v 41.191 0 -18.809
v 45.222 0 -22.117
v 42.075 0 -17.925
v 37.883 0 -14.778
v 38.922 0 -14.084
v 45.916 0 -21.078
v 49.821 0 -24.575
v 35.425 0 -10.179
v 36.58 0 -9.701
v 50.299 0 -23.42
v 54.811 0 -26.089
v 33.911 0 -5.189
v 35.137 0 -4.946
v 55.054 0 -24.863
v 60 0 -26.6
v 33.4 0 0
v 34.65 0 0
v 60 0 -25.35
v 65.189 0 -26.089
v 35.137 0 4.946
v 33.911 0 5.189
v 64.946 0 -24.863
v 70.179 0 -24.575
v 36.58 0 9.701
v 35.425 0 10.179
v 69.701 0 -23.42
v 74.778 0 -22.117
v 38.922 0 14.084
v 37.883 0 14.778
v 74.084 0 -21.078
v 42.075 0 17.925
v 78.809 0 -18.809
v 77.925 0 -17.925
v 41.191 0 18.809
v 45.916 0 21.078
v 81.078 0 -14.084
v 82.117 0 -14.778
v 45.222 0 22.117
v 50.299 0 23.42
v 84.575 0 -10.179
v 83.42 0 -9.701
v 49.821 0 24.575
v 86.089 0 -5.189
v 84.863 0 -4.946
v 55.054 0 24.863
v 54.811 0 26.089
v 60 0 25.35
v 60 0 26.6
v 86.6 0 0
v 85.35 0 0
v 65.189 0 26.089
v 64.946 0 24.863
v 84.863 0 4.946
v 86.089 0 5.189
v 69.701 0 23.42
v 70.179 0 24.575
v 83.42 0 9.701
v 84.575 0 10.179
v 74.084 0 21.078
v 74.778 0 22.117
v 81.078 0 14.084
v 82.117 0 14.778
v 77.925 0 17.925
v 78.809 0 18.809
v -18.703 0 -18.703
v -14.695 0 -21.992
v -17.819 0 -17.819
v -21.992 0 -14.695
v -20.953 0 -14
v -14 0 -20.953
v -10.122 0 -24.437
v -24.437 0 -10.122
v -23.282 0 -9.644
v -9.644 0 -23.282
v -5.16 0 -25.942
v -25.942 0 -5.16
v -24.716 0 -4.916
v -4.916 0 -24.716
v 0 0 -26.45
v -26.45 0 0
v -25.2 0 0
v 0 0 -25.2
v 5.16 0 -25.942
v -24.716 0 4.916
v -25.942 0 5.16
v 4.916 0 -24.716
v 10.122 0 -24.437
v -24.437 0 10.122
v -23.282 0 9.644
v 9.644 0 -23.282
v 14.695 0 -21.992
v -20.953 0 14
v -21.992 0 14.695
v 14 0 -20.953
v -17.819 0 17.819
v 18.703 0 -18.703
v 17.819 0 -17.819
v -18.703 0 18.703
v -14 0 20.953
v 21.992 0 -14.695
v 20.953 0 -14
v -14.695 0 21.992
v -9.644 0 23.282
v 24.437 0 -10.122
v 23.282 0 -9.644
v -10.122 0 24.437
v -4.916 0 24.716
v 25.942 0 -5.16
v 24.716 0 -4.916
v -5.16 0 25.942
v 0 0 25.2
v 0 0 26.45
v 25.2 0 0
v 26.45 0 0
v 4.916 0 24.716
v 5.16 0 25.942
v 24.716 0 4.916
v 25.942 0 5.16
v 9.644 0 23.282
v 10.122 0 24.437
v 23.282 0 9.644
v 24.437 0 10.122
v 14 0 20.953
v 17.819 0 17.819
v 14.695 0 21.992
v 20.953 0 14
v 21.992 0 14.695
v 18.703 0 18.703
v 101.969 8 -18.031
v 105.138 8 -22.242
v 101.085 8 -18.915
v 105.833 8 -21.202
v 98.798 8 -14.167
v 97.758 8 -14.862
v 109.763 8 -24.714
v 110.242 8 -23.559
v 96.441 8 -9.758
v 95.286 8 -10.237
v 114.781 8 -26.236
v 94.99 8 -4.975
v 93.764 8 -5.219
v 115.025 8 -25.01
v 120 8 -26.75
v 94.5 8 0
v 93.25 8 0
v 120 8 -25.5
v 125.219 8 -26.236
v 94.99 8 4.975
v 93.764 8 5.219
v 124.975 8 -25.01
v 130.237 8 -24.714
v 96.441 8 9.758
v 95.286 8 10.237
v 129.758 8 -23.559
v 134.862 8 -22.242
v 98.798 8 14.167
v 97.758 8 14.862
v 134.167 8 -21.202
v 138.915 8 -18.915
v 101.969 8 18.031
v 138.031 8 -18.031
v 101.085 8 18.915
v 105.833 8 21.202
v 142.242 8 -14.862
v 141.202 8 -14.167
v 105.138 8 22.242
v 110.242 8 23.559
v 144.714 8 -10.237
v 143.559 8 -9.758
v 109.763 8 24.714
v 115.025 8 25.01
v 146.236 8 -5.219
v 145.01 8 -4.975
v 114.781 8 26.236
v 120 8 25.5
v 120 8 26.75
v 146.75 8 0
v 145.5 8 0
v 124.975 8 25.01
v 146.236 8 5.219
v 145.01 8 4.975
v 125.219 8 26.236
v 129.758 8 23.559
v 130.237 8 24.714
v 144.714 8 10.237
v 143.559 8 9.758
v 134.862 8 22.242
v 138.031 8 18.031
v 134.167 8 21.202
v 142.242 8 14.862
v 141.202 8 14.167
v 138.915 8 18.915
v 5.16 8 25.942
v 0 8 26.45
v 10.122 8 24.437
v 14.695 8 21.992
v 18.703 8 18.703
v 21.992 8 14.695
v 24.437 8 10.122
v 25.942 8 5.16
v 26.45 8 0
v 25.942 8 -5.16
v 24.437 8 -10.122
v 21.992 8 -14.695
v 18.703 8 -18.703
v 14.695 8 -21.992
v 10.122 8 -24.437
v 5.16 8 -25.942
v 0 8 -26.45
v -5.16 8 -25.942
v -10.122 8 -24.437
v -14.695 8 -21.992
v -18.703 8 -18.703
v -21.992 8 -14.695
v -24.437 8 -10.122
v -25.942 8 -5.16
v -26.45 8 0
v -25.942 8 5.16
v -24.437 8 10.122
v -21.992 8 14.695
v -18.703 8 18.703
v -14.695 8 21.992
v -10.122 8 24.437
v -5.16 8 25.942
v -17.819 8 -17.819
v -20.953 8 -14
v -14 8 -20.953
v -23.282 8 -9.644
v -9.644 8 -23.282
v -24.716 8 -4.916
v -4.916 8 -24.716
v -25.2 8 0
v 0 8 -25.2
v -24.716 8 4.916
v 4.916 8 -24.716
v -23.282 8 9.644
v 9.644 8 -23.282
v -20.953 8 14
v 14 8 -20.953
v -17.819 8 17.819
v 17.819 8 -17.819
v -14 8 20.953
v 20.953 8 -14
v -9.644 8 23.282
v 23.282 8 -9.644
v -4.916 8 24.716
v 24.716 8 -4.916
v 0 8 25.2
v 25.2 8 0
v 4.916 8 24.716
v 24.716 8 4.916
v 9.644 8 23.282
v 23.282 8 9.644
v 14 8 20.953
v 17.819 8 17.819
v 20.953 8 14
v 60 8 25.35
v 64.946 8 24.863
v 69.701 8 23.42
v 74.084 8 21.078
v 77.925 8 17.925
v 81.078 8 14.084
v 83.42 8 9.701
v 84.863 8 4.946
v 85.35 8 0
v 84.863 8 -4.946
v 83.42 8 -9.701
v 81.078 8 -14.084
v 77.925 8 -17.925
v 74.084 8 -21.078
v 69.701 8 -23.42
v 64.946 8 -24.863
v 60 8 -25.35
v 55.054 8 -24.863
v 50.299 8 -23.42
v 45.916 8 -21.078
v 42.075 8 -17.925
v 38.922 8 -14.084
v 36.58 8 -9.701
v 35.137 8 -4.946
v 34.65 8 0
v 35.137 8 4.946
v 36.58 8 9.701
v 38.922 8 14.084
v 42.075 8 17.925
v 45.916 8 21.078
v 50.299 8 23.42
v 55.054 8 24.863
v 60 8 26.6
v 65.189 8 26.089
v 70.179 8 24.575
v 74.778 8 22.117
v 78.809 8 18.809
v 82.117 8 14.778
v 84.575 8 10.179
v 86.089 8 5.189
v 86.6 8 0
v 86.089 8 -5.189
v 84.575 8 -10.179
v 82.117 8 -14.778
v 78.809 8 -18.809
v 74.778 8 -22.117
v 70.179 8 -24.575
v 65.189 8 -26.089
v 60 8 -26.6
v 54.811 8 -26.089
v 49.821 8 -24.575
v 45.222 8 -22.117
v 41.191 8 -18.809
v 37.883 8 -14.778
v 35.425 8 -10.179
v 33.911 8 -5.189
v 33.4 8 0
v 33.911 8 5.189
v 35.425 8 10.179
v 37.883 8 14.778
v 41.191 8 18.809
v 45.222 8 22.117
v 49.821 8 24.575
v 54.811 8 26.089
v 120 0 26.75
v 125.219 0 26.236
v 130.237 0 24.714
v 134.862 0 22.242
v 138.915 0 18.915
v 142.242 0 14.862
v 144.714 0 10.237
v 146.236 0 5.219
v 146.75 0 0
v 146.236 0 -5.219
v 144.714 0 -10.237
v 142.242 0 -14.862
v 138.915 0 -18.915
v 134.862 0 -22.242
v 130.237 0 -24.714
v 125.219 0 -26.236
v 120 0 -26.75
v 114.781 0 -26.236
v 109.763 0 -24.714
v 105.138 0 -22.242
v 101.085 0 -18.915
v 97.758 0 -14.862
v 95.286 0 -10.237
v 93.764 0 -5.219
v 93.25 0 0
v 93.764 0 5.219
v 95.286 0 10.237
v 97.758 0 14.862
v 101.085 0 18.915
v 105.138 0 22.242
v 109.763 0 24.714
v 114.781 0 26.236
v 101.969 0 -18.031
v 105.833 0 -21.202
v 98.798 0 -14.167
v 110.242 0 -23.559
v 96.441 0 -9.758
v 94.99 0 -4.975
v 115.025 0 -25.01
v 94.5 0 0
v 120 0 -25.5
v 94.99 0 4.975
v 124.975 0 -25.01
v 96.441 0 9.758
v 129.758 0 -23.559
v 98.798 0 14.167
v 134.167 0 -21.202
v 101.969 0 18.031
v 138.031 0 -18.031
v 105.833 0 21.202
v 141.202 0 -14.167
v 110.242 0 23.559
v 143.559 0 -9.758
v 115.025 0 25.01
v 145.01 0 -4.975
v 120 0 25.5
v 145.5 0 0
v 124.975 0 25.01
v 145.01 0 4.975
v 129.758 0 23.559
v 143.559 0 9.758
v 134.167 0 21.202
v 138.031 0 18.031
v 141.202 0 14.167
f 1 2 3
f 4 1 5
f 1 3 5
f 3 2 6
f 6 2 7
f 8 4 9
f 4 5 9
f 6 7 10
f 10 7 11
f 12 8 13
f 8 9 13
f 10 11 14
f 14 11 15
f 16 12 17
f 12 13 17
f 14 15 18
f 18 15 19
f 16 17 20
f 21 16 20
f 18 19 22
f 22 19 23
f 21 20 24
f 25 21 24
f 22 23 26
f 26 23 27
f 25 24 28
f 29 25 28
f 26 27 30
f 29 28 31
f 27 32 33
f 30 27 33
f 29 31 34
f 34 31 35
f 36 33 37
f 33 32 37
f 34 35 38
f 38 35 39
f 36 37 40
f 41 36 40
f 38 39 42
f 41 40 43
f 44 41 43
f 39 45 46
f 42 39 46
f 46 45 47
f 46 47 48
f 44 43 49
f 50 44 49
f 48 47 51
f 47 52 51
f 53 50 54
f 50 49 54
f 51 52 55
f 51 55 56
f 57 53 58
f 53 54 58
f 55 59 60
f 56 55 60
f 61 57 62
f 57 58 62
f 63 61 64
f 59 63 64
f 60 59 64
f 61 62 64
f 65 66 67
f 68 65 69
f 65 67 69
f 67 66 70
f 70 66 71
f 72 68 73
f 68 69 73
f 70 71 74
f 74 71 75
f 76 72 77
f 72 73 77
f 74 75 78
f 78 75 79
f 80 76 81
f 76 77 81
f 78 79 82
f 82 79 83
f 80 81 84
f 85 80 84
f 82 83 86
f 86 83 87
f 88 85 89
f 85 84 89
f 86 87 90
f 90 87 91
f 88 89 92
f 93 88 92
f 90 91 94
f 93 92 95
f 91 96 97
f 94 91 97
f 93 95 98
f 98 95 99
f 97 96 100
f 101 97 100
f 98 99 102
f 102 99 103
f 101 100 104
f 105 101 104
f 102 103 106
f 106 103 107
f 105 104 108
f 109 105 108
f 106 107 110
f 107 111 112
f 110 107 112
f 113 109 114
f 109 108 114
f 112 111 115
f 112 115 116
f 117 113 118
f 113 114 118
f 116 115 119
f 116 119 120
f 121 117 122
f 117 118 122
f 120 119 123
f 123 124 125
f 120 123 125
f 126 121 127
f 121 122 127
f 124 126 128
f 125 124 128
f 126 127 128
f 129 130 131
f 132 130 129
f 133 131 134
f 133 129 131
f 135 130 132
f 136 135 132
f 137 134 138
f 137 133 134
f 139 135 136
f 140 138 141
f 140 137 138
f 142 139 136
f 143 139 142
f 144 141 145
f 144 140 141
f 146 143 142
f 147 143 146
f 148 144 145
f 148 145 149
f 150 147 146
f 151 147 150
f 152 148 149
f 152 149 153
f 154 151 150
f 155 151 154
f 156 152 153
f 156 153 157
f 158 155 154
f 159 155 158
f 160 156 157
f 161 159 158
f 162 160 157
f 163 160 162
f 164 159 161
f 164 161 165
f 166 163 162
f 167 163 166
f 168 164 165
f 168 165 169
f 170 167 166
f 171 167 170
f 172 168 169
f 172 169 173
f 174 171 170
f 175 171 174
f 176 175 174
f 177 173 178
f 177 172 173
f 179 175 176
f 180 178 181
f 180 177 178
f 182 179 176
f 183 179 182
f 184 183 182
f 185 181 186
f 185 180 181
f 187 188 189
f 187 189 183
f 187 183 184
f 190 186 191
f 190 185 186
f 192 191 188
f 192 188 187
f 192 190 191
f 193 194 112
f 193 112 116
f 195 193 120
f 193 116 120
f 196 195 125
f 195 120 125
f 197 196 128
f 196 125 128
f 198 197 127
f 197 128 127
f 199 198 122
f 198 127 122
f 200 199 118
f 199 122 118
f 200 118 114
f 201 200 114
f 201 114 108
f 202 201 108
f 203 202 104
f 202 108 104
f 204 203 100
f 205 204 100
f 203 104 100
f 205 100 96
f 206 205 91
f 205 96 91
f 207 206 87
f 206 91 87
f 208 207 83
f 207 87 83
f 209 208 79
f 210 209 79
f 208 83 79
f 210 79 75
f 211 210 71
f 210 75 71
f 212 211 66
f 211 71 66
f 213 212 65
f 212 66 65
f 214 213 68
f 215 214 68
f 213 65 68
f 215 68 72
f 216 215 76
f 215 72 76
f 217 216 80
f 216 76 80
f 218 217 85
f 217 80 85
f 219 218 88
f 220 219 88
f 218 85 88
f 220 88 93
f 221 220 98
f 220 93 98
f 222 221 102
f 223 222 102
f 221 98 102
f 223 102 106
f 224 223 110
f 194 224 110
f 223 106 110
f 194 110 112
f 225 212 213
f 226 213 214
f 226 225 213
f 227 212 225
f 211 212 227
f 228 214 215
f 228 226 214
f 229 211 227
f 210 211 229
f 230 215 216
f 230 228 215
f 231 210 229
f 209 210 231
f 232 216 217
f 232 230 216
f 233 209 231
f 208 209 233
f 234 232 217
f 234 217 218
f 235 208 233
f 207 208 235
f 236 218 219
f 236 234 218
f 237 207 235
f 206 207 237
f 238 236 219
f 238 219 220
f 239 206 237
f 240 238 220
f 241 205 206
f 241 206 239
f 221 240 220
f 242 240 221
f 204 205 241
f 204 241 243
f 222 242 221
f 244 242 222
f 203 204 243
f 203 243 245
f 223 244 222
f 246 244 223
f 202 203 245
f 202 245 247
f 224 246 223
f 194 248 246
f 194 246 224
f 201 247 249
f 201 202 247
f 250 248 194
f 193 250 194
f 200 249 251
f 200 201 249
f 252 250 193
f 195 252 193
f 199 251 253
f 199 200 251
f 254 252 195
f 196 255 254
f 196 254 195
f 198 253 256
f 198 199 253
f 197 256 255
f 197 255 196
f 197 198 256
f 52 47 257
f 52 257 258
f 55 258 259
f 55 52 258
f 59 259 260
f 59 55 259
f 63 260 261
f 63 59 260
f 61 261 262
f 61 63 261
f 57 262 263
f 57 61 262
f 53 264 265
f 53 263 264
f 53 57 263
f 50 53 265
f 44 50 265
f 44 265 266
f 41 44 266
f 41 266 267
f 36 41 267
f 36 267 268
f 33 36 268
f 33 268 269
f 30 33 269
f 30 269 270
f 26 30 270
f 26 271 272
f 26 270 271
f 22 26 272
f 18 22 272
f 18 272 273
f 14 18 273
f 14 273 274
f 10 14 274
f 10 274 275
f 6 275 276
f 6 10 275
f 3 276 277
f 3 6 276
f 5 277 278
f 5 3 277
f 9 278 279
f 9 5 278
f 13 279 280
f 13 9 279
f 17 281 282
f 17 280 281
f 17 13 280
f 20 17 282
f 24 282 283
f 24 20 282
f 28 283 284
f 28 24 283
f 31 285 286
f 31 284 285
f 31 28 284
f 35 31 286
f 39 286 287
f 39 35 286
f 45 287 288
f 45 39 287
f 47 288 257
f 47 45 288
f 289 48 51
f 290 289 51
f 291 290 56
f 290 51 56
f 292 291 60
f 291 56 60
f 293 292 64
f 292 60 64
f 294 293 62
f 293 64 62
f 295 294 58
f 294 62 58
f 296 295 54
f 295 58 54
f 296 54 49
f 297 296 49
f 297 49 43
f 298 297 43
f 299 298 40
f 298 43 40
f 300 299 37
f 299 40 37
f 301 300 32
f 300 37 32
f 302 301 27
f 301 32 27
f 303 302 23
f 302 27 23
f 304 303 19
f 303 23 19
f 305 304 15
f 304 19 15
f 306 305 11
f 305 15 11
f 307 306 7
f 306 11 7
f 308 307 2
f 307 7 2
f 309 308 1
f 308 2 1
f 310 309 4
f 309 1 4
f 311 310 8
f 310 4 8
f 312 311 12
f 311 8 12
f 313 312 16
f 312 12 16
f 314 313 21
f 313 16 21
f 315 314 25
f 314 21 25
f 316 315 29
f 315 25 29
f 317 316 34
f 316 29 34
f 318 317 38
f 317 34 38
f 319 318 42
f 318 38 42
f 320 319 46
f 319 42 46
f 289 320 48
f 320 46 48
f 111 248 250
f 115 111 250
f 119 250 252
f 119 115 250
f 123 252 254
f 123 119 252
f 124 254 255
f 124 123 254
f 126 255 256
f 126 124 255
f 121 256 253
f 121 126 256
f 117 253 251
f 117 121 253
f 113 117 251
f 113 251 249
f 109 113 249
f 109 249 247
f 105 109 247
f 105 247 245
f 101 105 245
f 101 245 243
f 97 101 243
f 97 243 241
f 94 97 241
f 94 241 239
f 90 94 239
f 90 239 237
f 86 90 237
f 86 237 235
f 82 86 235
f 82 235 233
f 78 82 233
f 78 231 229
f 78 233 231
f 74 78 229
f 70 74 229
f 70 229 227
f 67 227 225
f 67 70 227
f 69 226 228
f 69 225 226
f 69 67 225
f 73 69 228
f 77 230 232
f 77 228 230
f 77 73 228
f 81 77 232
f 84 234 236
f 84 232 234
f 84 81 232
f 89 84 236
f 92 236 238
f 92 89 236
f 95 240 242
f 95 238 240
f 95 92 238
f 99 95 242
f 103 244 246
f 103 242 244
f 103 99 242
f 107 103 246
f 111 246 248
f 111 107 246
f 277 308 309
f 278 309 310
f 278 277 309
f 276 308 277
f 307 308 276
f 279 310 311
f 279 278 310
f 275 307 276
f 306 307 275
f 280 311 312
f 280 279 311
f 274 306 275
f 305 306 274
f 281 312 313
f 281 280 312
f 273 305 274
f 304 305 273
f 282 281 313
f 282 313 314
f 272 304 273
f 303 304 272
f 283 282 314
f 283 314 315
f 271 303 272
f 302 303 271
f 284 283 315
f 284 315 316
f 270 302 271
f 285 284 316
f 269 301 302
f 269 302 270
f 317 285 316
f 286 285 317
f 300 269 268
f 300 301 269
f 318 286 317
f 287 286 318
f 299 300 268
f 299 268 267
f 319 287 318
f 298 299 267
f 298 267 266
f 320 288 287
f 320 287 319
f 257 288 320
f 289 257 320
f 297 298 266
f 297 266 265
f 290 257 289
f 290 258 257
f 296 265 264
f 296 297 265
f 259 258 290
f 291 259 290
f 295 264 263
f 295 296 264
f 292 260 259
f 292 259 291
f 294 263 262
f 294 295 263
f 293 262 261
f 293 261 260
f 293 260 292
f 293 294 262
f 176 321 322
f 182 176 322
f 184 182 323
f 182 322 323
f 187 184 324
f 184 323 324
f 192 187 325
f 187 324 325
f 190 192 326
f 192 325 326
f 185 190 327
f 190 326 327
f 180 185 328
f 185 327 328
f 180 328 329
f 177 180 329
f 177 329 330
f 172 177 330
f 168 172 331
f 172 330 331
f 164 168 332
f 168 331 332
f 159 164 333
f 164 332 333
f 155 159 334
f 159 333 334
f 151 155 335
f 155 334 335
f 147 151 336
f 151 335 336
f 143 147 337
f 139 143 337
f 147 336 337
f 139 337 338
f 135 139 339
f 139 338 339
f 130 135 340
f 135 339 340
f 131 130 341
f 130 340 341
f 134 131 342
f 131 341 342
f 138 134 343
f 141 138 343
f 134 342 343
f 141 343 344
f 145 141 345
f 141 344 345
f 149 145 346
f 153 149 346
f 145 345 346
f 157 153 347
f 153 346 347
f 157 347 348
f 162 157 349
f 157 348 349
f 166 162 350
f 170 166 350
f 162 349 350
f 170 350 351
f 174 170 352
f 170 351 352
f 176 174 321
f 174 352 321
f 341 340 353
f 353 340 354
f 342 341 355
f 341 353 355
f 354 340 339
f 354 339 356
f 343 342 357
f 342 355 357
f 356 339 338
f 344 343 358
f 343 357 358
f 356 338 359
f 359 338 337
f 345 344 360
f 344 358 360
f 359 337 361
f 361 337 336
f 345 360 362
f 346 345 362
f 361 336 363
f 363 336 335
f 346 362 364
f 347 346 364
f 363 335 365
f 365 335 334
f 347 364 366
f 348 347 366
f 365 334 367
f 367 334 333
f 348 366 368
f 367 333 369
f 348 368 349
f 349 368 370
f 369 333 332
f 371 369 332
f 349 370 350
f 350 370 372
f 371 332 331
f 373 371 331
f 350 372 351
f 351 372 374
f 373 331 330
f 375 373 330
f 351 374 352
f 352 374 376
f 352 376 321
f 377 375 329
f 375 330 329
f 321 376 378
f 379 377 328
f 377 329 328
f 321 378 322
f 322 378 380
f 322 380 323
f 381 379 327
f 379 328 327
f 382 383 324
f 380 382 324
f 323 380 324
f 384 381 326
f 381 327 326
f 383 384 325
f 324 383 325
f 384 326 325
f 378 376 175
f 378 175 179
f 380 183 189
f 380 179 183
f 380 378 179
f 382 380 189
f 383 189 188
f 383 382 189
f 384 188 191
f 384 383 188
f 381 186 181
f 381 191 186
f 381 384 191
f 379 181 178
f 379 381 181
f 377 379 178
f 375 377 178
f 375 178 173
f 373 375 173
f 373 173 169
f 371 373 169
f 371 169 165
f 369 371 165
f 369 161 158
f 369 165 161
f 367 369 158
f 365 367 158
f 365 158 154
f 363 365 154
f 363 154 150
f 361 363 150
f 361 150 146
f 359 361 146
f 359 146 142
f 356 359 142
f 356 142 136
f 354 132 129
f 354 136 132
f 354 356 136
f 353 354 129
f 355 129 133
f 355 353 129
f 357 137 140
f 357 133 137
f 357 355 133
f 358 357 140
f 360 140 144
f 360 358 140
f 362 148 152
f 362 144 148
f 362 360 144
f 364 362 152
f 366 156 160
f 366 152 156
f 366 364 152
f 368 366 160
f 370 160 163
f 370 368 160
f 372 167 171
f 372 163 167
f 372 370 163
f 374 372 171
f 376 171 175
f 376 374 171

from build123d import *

# Parameters (mm, degrees)
SKETCH2_R               = 26.45
BOSS_EXTRUDE1_DEPTH     = 8
CUT_EXTRUDE1_DEPTH      = 39.2518627
CUT_EXTRUDE1_DEPTH_BACK = 39.2518627
SKETCH3_R               = 25.2
SKETCH5_R               = 26.6
BOSS_EXTRUDE2_DEPTH     = 8
CUT_EXTRUDE2_DEPTH      = 91.945698084
CUT_EXTRUDE2_DEPTH_BACK = 91.945698084
SKETCH6_R               = 25.35
SKETCH7_R               = 26.75
BOSS_EXTRUDE3_DEPTH     = 8
CUT_EXTRUDE3_DEPTH      = 150.382478892
CUT_EXTRUDE3_DEPTH_BACK = 150.382478892
SKETCH8_R               = 25.5


with BuildPart() as part:
    # Sketch2 → Boss-Extrude1 (new body)
    with BuildSketch(Plane(origin=(0, 0, 0), x_dir=(1, 0, 0), z_dir=(0, 1, 0))):
        with Locations(Location((0, 0, 0), (0, 0, 270))):
            Circle(SKETCH2_R)
    extrude(amount=BOSS_EXTRUDE1_DEPTH)

    # Sketch3 → Cut-Extrude1 (cut, two sides: drawn at the far end of the back side and taken through both)
    with BuildSketch(Plane(origin=(0, 8, 0), x_dir=(1, 0, 0), z_dir=(0, 1, 0)).offset(-CUT_EXTRUDE1_DEPTH_BACK)):
        with Locations(Location((0, 0, 0), (0, 0, 270))):
            Circle(SKETCH3_R)
    extrude(amount=CUT_EXTRUDE1_DEPTH + CUT_EXTRUDE1_DEPTH_BACK, mode=Mode.SUBTRACT)


with BuildPart() as body_2:
    # Sketch5 → Boss-Extrude2 (new body)
    with BuildSketch(Plane(origin=(0, 0, 0), x_dir=(1, 0, 0), z_dir=(0, 1, 0))):
        with Locations(Location((60, 0, 0), (0, 0, 270))):
            Circle(SKETCH5_R)
    extrude(amount=BOSS_EXTRUDE2_DEPTH)

    # Sketch6 → Cut-Extrude2 (cut, two sides: drawn at the far end of the back side and taken through both)
    with BuildSketch(Plane(origin=(0, 8, 0), x_dir=(1, 0, 0), z_dir=(0, 1, 0)).offset(-CUT_EXTRUDE2_DEPTH_BACK)):
        with Locations(Location((60, 0, 0), (0, 0, 270))):
            Circle(SKETCH6_R)
    extrude(amount=CUT_EXTRUDE2_DEPTH + CUT_EXTRUDE2_DEPTH_BACK, mode=Mode.SUBTRACT)


with BuildPart() as body_3:
    # Sketch7 → Boss-Extrude3 (new body)
    with BuildSketch(Plane(origin=(0, 0, 0), x_dir=(1, 0, 0), z_dir=(0, 1, 0))):
        with Locations(Location((120, 0, 0), (0, 0, 270))):
            Circle(SKETCH7_R)
    extrude(amount=BOSS_EXTRUDE3_DEPTH)

    # Sketch8 → Cut-Extrude3 (cut, two sides: drawn at the far end of the back side and taken through both)
    with BuildSketch(Plane(origin=(0, 8, 0), x_dir=(1, 0, 0), z_dir=(0, 1, 0)).offset(-CUT_EXTRUDE3_DEPTH_BACK)):
        with Locations(Location((120, 0, 0), (0, 0, 270))):
            Circle(SKETCH8_R)
    extrude(amount=CUT_EXTRUDE3_DEPTH + CUT_EXTRUDE3_DEPTH_BACK, mode=Mode.SUBTRACT)


solid = Compound([part.part, body_2.part, body_3.part])
